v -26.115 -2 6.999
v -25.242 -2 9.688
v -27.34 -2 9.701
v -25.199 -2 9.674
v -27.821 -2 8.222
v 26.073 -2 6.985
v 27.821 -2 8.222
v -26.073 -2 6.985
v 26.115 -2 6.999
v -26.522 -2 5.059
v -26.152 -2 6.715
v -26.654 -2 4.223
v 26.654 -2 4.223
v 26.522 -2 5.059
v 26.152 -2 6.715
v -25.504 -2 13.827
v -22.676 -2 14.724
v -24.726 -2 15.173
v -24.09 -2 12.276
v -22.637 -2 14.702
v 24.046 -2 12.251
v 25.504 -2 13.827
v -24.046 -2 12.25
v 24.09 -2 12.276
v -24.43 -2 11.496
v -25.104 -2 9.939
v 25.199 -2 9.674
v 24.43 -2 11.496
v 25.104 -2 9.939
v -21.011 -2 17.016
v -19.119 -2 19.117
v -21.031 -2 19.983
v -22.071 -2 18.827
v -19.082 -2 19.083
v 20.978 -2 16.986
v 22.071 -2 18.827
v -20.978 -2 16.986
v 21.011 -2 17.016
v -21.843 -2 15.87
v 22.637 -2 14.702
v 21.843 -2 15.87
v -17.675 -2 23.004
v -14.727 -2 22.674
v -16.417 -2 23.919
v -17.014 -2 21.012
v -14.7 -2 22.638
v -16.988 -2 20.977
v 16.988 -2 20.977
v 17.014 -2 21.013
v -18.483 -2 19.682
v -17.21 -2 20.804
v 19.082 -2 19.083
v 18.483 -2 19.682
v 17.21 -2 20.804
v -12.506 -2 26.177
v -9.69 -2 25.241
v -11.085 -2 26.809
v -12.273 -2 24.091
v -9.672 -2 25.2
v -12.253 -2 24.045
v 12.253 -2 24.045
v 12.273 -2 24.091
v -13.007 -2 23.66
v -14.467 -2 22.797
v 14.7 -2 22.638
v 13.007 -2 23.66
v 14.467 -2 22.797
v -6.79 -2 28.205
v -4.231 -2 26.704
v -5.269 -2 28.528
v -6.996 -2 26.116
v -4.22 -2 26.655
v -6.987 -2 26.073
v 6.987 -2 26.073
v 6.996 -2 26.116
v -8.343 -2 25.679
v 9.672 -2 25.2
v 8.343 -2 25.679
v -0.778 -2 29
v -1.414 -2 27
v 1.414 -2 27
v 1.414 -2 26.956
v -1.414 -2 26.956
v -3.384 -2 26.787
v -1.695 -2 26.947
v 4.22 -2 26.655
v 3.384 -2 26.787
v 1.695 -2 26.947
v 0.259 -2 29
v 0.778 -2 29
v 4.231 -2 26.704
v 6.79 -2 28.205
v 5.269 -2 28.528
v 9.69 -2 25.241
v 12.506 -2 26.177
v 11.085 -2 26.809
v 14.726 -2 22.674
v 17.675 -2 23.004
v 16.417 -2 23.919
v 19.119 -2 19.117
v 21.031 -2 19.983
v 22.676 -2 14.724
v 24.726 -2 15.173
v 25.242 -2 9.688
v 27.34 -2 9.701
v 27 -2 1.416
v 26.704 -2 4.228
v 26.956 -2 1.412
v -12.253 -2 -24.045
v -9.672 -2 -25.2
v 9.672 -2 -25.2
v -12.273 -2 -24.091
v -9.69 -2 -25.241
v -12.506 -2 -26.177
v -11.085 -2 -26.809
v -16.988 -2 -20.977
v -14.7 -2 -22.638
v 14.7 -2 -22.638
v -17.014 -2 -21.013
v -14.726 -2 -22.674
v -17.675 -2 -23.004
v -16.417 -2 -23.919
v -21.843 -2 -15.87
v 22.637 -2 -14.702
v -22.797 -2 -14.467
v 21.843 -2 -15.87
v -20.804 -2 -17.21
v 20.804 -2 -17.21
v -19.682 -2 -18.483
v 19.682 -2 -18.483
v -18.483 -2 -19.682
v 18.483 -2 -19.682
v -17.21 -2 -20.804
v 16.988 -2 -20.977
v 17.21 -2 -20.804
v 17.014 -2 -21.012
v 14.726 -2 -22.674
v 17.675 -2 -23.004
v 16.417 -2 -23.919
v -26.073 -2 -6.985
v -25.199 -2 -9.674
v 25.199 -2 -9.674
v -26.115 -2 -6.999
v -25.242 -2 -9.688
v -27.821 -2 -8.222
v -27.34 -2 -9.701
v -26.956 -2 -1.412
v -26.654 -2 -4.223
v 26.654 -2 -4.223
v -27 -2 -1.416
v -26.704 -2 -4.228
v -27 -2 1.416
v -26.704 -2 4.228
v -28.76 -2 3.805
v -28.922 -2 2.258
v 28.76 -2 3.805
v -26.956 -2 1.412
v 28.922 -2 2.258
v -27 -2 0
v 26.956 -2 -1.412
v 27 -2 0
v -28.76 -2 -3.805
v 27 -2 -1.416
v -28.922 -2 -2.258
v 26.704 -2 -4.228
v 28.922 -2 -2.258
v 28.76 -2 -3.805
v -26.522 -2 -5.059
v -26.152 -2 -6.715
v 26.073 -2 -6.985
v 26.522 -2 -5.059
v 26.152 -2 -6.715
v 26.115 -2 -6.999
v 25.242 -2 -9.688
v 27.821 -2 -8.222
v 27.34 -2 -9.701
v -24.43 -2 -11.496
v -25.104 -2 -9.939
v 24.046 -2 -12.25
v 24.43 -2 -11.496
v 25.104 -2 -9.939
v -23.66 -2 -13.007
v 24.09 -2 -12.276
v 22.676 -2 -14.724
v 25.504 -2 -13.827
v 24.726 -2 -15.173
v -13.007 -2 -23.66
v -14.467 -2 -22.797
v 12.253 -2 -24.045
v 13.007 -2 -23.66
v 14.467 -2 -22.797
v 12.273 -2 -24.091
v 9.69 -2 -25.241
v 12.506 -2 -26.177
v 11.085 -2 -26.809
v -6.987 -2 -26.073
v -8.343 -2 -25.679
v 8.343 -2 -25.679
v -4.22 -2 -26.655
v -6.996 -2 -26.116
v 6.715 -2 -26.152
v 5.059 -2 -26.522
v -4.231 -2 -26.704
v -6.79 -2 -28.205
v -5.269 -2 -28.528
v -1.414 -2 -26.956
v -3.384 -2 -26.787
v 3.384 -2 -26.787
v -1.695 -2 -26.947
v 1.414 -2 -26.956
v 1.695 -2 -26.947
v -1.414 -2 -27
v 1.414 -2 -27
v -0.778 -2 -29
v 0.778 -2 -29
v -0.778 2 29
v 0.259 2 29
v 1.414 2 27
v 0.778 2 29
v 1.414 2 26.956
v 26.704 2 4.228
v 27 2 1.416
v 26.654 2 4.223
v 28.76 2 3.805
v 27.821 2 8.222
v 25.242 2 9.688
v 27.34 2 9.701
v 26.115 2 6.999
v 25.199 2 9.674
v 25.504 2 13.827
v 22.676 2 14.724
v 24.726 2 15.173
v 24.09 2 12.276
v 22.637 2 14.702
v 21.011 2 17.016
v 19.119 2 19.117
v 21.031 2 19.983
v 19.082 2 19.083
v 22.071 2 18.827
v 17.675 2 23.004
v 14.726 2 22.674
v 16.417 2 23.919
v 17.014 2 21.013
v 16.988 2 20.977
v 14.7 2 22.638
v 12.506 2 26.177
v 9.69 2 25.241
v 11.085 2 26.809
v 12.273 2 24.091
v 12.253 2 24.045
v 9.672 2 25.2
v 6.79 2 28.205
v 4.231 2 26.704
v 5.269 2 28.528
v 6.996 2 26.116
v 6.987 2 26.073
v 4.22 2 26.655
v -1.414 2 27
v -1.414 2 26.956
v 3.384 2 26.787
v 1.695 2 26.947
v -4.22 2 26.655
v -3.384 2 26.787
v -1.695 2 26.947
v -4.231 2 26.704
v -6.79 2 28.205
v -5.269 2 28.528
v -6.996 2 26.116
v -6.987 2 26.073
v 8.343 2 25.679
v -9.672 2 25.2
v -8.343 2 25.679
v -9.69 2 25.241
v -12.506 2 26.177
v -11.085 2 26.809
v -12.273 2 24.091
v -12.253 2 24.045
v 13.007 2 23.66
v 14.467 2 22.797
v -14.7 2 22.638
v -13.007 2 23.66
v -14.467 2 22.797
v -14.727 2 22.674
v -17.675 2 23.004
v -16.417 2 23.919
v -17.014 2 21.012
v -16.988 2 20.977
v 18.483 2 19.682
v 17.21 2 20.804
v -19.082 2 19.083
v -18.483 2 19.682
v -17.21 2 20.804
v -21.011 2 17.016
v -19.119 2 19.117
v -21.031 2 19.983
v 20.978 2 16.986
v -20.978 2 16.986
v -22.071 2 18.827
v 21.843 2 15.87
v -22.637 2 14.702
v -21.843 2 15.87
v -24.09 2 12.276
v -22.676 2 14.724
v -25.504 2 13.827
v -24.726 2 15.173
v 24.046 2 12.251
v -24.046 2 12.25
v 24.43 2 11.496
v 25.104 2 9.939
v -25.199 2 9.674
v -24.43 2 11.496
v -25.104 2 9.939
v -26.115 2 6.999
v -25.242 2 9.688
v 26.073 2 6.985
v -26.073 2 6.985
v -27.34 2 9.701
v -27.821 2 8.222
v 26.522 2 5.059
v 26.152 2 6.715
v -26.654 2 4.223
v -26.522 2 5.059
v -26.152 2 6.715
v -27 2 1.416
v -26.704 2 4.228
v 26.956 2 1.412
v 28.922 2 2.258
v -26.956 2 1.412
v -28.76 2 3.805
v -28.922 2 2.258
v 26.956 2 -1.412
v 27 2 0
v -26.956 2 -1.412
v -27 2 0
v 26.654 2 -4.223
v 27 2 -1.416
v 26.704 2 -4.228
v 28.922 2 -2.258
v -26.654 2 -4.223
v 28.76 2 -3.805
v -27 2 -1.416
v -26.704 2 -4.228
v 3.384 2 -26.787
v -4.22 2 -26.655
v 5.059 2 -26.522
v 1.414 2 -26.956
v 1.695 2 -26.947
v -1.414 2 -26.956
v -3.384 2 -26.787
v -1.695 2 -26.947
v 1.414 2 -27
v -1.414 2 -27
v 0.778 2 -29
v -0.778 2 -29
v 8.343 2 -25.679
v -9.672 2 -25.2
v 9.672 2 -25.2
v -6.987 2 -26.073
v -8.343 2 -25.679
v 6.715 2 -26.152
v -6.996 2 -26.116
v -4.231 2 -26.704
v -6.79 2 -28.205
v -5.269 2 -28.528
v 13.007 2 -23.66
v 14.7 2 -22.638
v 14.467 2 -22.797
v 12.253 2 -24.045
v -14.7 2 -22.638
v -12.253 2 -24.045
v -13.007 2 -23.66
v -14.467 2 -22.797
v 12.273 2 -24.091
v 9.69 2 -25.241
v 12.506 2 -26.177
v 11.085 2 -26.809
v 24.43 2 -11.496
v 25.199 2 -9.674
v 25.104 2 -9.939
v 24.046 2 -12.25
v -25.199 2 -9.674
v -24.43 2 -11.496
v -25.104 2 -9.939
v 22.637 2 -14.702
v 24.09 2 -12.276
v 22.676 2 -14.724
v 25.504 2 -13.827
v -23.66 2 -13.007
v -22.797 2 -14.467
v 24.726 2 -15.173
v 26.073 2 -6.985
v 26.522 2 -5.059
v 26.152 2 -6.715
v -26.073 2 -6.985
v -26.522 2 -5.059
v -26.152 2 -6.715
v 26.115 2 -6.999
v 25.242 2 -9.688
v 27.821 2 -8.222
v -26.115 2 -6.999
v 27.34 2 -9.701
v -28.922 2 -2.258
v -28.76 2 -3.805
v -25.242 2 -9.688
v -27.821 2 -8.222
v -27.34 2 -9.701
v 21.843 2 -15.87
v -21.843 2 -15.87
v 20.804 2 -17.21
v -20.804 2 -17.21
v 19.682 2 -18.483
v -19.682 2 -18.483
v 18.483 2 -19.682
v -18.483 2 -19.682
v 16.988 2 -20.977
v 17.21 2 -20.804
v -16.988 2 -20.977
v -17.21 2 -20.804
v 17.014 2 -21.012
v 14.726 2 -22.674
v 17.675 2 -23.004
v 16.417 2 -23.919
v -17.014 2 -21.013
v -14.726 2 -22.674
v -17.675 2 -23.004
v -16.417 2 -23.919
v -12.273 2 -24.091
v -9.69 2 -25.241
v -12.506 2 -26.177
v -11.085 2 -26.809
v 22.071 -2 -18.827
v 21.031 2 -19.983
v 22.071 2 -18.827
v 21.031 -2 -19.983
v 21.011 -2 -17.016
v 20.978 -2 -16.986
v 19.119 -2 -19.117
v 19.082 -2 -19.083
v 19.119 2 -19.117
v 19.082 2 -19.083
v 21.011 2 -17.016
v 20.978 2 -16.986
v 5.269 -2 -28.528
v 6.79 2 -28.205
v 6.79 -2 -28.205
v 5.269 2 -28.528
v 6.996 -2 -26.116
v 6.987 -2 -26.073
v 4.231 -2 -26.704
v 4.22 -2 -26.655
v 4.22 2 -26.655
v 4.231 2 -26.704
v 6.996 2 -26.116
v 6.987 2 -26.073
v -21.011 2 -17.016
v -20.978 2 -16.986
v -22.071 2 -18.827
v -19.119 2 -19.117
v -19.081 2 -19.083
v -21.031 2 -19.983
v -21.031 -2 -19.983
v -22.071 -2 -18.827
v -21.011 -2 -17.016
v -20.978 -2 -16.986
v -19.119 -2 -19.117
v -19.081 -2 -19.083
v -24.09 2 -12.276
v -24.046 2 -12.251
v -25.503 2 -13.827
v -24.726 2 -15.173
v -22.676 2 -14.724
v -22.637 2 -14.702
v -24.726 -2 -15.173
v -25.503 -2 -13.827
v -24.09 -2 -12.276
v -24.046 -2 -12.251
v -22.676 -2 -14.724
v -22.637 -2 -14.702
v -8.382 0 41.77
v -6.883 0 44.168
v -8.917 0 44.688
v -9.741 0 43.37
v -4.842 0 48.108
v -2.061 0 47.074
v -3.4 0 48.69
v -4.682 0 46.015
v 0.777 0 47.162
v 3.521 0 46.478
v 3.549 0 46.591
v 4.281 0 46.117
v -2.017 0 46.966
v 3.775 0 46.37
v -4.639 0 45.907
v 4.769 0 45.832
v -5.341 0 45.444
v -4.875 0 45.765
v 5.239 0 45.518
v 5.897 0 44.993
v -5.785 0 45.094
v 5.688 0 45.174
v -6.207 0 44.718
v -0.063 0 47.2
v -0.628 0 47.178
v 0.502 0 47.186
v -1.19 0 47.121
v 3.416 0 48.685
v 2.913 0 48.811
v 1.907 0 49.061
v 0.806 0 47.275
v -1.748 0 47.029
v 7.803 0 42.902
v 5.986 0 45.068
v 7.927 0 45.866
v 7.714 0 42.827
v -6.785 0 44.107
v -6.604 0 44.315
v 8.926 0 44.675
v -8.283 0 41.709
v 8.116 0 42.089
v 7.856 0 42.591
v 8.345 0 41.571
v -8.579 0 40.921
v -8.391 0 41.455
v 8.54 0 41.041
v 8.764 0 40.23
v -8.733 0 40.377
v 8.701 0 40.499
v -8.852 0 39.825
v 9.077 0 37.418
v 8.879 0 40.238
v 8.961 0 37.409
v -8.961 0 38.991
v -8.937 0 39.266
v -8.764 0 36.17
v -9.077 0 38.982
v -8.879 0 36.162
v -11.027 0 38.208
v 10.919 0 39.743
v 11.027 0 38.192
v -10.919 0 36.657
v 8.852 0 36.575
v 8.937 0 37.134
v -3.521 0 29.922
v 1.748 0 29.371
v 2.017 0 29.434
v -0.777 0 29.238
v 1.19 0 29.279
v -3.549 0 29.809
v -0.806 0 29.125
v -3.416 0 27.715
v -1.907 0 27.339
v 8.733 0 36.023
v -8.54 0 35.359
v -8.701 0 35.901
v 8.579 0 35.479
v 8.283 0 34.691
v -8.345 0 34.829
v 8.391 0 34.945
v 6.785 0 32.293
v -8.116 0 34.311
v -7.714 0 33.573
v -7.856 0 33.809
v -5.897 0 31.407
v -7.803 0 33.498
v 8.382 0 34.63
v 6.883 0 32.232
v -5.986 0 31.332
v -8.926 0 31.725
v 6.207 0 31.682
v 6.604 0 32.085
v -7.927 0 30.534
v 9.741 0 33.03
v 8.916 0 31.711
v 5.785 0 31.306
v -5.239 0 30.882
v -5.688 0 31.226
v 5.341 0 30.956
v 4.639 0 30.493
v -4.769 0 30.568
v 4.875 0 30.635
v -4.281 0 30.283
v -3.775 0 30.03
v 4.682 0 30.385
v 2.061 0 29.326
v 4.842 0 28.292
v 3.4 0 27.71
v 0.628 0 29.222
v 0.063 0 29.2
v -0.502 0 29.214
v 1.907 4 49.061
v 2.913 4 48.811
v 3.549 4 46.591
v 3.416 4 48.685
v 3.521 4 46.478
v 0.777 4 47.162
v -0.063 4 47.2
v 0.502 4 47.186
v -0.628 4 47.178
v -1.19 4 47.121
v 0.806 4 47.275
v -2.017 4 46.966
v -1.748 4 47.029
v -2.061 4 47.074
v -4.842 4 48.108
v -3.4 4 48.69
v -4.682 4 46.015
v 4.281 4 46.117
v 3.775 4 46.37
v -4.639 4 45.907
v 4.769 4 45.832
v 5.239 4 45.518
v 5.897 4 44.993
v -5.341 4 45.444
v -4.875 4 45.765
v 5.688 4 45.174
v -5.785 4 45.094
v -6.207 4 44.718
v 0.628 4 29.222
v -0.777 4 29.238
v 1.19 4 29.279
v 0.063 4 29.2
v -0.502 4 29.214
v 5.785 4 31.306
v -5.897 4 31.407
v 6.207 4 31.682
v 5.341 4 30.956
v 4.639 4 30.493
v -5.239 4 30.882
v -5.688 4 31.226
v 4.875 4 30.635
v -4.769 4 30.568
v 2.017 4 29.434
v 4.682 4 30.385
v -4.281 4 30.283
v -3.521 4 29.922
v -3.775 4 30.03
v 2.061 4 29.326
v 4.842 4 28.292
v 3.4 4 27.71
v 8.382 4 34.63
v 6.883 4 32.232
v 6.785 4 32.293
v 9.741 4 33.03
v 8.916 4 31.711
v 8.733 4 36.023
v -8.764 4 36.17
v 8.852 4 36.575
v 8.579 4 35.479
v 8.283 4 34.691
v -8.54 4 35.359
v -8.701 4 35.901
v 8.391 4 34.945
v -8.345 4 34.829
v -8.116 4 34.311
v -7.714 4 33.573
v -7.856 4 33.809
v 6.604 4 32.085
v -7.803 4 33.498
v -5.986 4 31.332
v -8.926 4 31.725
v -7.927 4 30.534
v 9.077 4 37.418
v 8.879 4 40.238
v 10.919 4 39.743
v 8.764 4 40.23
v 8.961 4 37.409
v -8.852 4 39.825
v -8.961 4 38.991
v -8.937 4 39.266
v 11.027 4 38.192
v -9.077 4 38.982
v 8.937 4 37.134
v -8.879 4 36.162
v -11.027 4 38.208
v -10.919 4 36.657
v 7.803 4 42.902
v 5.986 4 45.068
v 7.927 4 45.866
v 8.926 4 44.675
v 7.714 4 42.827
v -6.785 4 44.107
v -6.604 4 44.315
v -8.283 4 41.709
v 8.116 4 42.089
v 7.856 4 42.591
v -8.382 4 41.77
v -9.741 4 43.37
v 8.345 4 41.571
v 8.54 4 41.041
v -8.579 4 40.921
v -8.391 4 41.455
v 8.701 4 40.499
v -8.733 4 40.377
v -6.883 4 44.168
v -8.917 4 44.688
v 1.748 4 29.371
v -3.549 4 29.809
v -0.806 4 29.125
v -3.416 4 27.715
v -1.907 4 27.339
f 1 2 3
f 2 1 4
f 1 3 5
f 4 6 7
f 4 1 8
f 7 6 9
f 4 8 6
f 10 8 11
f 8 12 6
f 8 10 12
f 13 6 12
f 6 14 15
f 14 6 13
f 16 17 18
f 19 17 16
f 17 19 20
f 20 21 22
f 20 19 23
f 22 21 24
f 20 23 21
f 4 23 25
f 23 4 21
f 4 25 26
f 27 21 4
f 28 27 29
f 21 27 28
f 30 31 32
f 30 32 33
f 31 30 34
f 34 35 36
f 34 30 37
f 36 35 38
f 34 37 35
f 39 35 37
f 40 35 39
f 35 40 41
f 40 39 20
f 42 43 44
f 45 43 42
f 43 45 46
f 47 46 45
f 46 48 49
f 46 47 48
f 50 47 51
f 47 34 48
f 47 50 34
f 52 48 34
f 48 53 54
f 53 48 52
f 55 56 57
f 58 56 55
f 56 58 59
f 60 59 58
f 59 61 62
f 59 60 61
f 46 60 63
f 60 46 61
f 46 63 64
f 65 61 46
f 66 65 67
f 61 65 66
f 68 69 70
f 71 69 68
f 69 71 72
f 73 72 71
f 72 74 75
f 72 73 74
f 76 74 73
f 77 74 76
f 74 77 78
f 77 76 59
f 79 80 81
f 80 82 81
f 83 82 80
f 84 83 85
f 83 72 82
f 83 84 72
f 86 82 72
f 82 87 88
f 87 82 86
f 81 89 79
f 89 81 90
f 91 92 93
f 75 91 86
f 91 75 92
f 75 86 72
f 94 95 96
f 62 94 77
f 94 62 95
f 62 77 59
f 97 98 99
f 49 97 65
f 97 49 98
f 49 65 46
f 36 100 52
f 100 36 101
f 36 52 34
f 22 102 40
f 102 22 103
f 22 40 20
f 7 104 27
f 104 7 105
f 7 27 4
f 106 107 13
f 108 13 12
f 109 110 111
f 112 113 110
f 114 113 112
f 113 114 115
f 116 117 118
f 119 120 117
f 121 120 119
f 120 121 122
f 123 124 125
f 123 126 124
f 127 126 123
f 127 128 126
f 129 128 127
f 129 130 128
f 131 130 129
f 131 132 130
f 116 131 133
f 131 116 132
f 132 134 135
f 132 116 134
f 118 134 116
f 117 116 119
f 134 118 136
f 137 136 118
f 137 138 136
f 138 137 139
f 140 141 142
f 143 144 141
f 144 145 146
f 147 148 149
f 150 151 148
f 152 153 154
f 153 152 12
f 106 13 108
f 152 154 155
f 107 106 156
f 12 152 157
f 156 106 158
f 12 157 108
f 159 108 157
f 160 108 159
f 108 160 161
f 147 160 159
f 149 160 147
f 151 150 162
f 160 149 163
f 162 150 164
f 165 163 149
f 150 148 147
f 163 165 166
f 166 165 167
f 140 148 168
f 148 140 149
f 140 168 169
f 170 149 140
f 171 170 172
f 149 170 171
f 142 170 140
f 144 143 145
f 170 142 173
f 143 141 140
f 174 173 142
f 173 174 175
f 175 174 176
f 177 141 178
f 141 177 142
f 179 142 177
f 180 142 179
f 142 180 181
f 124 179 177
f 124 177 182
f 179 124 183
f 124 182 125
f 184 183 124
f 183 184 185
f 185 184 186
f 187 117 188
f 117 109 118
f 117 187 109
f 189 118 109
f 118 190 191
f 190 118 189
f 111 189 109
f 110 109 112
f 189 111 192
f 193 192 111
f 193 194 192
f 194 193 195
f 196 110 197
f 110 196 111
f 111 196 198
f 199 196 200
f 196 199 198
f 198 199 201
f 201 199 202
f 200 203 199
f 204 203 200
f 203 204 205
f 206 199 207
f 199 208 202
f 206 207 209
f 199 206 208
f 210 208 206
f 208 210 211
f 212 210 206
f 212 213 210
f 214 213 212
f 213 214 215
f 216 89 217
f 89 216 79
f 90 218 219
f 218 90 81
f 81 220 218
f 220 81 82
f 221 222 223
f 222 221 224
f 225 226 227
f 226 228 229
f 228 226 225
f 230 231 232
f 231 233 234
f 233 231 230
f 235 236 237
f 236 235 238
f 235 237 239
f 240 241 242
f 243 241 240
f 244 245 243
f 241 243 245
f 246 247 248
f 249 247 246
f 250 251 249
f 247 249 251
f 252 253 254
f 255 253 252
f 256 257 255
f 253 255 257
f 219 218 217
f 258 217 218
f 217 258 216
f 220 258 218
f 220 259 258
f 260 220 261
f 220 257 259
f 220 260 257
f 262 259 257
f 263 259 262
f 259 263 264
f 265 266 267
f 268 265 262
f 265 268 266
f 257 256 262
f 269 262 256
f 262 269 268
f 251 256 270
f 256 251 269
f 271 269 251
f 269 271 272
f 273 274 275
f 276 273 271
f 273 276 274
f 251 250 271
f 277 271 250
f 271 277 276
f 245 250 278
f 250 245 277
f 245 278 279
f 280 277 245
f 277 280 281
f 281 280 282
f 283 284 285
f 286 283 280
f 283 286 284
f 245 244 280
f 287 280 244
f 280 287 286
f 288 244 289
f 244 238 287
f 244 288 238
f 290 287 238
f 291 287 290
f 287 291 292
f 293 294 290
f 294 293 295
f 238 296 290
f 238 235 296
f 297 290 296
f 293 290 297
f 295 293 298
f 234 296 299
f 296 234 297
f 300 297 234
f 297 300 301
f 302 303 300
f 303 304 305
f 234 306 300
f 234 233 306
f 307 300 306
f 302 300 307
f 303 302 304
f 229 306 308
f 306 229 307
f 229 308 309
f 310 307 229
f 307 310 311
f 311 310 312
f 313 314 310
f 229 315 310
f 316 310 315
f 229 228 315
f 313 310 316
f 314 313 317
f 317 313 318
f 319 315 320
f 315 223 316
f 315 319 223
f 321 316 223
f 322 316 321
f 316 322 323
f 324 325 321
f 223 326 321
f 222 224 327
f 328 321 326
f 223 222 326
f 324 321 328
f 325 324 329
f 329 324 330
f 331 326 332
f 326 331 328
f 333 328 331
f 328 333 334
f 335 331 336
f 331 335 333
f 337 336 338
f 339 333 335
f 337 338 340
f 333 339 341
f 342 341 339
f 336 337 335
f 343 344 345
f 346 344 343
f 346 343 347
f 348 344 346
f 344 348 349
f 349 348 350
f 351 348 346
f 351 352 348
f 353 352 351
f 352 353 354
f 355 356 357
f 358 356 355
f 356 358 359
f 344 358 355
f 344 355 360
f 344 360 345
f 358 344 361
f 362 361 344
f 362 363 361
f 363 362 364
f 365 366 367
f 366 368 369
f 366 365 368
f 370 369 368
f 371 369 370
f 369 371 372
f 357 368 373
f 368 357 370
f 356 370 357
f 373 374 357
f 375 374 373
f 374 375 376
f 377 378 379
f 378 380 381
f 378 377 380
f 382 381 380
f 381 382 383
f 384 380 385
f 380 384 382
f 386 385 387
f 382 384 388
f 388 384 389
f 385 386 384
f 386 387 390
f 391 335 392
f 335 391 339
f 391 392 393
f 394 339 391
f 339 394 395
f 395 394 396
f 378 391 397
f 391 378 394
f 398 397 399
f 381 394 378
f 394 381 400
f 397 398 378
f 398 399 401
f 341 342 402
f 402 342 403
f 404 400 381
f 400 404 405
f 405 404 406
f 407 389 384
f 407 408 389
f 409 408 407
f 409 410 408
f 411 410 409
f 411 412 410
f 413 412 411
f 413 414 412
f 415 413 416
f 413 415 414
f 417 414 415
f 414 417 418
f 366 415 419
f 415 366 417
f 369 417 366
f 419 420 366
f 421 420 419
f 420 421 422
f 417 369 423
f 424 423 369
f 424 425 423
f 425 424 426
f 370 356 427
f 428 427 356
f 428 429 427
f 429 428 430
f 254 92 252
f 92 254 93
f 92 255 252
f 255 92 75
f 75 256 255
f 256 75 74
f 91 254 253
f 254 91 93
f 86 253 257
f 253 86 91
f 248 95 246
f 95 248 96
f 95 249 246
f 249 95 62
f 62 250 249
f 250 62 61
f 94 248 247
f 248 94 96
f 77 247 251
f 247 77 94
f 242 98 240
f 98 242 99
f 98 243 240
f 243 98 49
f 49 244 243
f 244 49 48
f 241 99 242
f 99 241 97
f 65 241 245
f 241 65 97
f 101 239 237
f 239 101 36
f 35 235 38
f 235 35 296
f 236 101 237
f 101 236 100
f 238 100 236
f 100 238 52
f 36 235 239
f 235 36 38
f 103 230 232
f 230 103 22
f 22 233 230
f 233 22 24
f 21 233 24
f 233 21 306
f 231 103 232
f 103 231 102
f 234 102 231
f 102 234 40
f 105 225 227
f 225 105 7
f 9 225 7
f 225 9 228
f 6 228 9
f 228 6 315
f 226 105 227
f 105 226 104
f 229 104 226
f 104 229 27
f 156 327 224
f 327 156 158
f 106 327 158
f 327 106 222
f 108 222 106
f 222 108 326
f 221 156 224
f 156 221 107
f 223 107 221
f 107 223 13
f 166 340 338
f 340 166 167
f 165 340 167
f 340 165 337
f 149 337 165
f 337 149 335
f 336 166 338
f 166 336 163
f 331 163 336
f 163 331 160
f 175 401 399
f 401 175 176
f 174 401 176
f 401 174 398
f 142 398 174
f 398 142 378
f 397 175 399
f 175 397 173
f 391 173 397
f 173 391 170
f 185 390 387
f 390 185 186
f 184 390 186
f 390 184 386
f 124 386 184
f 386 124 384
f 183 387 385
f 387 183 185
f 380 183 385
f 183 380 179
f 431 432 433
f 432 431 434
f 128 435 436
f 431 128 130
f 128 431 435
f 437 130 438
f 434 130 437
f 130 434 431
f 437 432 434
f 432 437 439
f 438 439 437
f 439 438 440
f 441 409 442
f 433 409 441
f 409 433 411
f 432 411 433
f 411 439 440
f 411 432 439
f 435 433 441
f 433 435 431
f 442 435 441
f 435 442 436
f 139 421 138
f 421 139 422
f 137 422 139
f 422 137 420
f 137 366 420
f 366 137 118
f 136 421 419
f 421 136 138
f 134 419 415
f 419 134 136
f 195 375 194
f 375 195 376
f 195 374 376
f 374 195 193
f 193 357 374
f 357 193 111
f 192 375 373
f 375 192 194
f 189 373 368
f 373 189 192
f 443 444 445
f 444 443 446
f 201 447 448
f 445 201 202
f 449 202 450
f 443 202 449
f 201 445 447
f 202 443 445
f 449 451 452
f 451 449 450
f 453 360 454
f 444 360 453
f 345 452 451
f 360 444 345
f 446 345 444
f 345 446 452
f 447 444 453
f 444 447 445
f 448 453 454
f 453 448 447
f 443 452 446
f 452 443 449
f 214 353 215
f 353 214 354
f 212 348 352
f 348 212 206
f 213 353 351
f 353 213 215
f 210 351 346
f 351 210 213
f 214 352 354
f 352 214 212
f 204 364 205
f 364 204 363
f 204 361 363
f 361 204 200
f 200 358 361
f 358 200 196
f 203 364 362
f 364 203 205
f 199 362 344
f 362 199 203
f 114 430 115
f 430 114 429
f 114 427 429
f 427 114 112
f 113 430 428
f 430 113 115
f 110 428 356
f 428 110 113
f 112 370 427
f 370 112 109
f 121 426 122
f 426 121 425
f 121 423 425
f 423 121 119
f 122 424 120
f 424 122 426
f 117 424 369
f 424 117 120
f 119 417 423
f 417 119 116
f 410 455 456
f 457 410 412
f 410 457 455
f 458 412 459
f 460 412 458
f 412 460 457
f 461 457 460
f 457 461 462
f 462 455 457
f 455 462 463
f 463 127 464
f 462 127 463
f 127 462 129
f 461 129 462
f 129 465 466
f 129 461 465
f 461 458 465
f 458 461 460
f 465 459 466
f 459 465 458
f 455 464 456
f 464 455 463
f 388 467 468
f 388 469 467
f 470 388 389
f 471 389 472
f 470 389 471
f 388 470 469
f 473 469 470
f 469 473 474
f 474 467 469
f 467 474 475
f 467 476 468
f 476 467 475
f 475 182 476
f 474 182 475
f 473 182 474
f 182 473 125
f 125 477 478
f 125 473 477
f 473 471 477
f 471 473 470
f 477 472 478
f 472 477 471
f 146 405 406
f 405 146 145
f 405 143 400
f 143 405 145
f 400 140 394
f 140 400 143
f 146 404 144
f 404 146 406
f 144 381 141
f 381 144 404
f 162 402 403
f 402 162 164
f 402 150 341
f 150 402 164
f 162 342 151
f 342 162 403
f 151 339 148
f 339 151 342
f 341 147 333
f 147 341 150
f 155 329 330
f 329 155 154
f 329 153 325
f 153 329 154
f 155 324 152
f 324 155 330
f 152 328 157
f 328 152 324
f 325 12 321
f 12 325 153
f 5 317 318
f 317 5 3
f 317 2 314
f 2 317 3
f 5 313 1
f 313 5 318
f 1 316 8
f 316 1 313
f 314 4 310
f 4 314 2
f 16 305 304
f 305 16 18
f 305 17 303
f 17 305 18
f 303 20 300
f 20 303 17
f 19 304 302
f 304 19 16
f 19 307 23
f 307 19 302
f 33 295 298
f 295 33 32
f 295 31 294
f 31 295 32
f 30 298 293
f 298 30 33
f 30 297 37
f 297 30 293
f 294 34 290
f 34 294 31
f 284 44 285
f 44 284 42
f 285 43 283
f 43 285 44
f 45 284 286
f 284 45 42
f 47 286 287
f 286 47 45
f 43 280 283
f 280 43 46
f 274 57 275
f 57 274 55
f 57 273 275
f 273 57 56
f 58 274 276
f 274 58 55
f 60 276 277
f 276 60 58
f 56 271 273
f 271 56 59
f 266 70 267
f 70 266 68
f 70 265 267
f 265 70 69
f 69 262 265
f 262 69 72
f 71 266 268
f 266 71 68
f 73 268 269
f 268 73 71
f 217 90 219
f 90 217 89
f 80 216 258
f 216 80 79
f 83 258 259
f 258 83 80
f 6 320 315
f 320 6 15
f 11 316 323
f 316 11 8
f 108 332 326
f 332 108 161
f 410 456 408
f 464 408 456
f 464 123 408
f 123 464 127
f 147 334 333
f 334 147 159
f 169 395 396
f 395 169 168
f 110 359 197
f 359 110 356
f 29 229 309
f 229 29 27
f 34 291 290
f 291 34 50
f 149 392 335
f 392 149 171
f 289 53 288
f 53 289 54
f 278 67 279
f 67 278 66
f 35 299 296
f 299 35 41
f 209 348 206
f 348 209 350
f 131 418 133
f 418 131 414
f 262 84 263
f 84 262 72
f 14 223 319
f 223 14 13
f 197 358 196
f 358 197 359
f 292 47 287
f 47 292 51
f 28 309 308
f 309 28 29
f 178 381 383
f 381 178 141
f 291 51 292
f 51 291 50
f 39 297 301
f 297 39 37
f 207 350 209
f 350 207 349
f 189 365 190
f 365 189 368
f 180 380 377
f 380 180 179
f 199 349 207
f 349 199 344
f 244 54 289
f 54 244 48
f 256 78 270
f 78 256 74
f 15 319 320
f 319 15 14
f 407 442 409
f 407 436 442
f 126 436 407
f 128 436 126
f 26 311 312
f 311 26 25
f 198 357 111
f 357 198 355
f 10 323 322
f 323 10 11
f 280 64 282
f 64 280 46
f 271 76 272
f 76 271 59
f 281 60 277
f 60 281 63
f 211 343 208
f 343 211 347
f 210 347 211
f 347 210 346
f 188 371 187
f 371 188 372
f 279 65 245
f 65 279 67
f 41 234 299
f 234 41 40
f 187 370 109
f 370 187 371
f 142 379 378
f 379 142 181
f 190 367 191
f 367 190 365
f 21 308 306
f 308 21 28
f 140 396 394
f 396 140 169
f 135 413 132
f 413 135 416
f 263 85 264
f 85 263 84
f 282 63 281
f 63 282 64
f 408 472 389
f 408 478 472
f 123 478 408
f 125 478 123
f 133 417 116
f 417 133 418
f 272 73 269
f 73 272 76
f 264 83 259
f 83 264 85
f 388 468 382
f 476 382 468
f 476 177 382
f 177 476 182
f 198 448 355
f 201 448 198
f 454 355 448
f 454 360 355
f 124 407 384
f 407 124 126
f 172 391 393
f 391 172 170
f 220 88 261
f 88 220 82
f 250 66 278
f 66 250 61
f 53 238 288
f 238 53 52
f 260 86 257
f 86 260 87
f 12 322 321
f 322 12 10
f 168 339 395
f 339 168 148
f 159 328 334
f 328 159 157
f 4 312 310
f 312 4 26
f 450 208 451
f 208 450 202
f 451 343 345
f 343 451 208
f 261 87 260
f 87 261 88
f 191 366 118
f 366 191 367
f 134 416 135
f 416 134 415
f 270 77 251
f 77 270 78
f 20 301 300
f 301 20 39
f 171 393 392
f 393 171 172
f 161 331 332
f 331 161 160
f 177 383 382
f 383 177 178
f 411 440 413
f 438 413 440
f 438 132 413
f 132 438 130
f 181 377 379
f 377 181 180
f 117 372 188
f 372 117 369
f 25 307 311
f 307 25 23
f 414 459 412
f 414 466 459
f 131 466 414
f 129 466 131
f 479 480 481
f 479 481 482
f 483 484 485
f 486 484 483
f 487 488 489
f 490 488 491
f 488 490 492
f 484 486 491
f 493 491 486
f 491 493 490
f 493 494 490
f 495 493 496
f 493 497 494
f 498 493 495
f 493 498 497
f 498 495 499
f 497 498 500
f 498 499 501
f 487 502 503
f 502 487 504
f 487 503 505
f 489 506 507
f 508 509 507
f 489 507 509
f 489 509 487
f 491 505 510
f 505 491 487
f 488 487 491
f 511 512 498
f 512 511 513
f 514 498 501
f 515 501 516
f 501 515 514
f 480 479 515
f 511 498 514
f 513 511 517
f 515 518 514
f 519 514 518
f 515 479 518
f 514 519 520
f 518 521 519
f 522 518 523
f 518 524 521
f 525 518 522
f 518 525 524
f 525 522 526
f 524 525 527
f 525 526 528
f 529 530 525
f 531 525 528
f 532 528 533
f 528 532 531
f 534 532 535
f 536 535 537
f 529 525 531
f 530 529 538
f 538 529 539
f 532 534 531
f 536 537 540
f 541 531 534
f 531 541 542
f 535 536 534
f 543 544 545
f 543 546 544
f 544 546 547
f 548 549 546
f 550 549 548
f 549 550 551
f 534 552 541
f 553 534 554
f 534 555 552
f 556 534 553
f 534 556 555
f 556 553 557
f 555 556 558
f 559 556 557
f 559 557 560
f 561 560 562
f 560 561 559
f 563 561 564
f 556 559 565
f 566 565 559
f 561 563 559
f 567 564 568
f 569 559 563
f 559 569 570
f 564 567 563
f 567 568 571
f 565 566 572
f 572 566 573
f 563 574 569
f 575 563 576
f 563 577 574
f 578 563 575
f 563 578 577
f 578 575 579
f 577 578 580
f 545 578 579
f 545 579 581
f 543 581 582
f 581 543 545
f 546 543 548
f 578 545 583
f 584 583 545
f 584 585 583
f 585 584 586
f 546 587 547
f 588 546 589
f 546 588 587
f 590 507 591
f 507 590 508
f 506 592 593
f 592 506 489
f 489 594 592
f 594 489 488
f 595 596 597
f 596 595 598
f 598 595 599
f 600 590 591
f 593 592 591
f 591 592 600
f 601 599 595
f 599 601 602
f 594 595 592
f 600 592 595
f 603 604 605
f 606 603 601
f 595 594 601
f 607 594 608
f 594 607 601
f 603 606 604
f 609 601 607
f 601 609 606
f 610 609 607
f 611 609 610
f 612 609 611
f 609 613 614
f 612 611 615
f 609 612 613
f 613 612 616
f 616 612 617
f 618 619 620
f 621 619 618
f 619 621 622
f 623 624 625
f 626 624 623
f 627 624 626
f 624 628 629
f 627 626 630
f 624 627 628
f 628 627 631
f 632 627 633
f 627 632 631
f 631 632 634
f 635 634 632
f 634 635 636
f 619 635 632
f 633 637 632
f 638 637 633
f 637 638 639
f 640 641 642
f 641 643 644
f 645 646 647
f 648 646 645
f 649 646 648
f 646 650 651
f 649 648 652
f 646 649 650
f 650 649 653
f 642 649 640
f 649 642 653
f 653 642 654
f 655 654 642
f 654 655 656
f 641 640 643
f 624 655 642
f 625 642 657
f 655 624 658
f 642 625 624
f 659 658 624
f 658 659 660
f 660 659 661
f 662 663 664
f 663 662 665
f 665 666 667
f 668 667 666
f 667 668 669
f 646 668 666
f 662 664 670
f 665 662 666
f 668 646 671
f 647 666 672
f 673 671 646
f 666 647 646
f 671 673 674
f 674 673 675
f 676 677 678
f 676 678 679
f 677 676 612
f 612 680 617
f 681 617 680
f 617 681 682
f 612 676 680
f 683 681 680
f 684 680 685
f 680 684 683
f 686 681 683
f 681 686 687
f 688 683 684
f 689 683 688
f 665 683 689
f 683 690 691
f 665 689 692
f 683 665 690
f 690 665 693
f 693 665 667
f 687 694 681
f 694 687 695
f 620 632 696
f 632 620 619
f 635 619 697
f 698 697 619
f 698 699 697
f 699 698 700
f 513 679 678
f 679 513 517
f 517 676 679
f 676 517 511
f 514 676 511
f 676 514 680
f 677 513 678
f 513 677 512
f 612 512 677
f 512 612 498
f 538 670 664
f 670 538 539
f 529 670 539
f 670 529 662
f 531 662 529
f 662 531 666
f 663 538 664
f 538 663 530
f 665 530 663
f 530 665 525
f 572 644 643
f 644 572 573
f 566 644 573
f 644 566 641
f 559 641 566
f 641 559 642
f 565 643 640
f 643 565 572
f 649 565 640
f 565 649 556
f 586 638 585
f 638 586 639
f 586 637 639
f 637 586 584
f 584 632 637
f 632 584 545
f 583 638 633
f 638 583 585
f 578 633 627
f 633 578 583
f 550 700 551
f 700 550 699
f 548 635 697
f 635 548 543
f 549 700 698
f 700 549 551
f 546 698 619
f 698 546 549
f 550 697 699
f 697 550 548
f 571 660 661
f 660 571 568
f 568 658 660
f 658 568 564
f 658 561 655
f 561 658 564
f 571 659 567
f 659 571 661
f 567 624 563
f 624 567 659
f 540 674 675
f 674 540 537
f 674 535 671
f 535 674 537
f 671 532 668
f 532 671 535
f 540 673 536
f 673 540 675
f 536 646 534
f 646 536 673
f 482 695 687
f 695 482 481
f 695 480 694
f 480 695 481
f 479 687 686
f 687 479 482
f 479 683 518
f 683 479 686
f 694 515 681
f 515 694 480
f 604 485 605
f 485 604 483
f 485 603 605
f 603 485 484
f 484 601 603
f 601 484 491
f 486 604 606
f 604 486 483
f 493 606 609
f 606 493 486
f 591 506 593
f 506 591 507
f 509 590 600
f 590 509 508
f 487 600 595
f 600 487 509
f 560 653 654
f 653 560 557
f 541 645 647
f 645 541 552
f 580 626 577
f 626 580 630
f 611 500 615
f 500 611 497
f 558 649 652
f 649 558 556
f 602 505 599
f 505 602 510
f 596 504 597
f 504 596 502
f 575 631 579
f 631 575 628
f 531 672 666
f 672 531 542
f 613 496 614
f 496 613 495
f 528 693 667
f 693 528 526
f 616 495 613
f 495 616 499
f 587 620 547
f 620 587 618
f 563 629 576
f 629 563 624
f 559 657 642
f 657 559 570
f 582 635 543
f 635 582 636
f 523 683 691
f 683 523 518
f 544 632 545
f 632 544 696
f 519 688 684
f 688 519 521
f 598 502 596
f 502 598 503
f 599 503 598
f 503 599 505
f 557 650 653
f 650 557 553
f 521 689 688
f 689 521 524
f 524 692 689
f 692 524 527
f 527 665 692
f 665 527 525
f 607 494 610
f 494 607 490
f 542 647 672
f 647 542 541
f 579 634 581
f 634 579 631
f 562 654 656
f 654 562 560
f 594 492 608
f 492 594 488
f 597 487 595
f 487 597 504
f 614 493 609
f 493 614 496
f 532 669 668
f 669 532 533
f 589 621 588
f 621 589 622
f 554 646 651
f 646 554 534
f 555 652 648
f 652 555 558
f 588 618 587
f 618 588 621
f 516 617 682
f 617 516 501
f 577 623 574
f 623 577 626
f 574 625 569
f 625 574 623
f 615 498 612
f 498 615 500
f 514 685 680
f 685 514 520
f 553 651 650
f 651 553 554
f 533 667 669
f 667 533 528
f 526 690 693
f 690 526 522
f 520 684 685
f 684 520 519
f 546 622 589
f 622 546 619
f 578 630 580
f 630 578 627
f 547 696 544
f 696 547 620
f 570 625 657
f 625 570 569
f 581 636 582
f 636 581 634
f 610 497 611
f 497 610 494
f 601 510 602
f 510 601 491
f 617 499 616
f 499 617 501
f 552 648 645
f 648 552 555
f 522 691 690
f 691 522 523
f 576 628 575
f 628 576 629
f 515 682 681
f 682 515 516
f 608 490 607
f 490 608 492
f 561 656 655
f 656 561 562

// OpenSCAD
pi = 3.141592;
rtod = 57.2957795;

module gear(inner=27, outer=29, depth=4, teeth=30.0, toothThinning=0.55) {
    circ=2*pi*inner;
    outer=outer-inner;
    toothBase=circ/teeth;
    tooth = [
        [-(toothBase/2), -inner/10],
        [-(toothBase/2), 0],
        [-(toothBase/2)*toothThinning, outer],
        [+(toothBase/2)*toothThinning, outer],
        [+(toothBase/2), 0],
        [+(toothBase/2), -inner/10],
    ];
    for (theta = [0:2*(toothBase/inner)*rtod: 2*pi*rtod]) {
        rotate(theta, [0,1,0]) translate([0,0,inner])
        rotate(90, [1,0,0]) translate([0,0,-depth/2]) linear_extrude(depth) polygon(tooth);
    }
    translate([0,0,0]) rotate(90, [1,0,0]) cylinder(r=inner, h=depth, center=true, $fn=100);
}

rotate(($t*200)/3.0,[0,1,0]) gear(inner=27, outer=29, teeth=60);
rotate(0,[0,1,0]) translate([0,2,38.2]) rotate(14,[0,1,0]) rotate(-200*$t,[0,1,0]) gear(inner=9, outer=11, teeth=20);
